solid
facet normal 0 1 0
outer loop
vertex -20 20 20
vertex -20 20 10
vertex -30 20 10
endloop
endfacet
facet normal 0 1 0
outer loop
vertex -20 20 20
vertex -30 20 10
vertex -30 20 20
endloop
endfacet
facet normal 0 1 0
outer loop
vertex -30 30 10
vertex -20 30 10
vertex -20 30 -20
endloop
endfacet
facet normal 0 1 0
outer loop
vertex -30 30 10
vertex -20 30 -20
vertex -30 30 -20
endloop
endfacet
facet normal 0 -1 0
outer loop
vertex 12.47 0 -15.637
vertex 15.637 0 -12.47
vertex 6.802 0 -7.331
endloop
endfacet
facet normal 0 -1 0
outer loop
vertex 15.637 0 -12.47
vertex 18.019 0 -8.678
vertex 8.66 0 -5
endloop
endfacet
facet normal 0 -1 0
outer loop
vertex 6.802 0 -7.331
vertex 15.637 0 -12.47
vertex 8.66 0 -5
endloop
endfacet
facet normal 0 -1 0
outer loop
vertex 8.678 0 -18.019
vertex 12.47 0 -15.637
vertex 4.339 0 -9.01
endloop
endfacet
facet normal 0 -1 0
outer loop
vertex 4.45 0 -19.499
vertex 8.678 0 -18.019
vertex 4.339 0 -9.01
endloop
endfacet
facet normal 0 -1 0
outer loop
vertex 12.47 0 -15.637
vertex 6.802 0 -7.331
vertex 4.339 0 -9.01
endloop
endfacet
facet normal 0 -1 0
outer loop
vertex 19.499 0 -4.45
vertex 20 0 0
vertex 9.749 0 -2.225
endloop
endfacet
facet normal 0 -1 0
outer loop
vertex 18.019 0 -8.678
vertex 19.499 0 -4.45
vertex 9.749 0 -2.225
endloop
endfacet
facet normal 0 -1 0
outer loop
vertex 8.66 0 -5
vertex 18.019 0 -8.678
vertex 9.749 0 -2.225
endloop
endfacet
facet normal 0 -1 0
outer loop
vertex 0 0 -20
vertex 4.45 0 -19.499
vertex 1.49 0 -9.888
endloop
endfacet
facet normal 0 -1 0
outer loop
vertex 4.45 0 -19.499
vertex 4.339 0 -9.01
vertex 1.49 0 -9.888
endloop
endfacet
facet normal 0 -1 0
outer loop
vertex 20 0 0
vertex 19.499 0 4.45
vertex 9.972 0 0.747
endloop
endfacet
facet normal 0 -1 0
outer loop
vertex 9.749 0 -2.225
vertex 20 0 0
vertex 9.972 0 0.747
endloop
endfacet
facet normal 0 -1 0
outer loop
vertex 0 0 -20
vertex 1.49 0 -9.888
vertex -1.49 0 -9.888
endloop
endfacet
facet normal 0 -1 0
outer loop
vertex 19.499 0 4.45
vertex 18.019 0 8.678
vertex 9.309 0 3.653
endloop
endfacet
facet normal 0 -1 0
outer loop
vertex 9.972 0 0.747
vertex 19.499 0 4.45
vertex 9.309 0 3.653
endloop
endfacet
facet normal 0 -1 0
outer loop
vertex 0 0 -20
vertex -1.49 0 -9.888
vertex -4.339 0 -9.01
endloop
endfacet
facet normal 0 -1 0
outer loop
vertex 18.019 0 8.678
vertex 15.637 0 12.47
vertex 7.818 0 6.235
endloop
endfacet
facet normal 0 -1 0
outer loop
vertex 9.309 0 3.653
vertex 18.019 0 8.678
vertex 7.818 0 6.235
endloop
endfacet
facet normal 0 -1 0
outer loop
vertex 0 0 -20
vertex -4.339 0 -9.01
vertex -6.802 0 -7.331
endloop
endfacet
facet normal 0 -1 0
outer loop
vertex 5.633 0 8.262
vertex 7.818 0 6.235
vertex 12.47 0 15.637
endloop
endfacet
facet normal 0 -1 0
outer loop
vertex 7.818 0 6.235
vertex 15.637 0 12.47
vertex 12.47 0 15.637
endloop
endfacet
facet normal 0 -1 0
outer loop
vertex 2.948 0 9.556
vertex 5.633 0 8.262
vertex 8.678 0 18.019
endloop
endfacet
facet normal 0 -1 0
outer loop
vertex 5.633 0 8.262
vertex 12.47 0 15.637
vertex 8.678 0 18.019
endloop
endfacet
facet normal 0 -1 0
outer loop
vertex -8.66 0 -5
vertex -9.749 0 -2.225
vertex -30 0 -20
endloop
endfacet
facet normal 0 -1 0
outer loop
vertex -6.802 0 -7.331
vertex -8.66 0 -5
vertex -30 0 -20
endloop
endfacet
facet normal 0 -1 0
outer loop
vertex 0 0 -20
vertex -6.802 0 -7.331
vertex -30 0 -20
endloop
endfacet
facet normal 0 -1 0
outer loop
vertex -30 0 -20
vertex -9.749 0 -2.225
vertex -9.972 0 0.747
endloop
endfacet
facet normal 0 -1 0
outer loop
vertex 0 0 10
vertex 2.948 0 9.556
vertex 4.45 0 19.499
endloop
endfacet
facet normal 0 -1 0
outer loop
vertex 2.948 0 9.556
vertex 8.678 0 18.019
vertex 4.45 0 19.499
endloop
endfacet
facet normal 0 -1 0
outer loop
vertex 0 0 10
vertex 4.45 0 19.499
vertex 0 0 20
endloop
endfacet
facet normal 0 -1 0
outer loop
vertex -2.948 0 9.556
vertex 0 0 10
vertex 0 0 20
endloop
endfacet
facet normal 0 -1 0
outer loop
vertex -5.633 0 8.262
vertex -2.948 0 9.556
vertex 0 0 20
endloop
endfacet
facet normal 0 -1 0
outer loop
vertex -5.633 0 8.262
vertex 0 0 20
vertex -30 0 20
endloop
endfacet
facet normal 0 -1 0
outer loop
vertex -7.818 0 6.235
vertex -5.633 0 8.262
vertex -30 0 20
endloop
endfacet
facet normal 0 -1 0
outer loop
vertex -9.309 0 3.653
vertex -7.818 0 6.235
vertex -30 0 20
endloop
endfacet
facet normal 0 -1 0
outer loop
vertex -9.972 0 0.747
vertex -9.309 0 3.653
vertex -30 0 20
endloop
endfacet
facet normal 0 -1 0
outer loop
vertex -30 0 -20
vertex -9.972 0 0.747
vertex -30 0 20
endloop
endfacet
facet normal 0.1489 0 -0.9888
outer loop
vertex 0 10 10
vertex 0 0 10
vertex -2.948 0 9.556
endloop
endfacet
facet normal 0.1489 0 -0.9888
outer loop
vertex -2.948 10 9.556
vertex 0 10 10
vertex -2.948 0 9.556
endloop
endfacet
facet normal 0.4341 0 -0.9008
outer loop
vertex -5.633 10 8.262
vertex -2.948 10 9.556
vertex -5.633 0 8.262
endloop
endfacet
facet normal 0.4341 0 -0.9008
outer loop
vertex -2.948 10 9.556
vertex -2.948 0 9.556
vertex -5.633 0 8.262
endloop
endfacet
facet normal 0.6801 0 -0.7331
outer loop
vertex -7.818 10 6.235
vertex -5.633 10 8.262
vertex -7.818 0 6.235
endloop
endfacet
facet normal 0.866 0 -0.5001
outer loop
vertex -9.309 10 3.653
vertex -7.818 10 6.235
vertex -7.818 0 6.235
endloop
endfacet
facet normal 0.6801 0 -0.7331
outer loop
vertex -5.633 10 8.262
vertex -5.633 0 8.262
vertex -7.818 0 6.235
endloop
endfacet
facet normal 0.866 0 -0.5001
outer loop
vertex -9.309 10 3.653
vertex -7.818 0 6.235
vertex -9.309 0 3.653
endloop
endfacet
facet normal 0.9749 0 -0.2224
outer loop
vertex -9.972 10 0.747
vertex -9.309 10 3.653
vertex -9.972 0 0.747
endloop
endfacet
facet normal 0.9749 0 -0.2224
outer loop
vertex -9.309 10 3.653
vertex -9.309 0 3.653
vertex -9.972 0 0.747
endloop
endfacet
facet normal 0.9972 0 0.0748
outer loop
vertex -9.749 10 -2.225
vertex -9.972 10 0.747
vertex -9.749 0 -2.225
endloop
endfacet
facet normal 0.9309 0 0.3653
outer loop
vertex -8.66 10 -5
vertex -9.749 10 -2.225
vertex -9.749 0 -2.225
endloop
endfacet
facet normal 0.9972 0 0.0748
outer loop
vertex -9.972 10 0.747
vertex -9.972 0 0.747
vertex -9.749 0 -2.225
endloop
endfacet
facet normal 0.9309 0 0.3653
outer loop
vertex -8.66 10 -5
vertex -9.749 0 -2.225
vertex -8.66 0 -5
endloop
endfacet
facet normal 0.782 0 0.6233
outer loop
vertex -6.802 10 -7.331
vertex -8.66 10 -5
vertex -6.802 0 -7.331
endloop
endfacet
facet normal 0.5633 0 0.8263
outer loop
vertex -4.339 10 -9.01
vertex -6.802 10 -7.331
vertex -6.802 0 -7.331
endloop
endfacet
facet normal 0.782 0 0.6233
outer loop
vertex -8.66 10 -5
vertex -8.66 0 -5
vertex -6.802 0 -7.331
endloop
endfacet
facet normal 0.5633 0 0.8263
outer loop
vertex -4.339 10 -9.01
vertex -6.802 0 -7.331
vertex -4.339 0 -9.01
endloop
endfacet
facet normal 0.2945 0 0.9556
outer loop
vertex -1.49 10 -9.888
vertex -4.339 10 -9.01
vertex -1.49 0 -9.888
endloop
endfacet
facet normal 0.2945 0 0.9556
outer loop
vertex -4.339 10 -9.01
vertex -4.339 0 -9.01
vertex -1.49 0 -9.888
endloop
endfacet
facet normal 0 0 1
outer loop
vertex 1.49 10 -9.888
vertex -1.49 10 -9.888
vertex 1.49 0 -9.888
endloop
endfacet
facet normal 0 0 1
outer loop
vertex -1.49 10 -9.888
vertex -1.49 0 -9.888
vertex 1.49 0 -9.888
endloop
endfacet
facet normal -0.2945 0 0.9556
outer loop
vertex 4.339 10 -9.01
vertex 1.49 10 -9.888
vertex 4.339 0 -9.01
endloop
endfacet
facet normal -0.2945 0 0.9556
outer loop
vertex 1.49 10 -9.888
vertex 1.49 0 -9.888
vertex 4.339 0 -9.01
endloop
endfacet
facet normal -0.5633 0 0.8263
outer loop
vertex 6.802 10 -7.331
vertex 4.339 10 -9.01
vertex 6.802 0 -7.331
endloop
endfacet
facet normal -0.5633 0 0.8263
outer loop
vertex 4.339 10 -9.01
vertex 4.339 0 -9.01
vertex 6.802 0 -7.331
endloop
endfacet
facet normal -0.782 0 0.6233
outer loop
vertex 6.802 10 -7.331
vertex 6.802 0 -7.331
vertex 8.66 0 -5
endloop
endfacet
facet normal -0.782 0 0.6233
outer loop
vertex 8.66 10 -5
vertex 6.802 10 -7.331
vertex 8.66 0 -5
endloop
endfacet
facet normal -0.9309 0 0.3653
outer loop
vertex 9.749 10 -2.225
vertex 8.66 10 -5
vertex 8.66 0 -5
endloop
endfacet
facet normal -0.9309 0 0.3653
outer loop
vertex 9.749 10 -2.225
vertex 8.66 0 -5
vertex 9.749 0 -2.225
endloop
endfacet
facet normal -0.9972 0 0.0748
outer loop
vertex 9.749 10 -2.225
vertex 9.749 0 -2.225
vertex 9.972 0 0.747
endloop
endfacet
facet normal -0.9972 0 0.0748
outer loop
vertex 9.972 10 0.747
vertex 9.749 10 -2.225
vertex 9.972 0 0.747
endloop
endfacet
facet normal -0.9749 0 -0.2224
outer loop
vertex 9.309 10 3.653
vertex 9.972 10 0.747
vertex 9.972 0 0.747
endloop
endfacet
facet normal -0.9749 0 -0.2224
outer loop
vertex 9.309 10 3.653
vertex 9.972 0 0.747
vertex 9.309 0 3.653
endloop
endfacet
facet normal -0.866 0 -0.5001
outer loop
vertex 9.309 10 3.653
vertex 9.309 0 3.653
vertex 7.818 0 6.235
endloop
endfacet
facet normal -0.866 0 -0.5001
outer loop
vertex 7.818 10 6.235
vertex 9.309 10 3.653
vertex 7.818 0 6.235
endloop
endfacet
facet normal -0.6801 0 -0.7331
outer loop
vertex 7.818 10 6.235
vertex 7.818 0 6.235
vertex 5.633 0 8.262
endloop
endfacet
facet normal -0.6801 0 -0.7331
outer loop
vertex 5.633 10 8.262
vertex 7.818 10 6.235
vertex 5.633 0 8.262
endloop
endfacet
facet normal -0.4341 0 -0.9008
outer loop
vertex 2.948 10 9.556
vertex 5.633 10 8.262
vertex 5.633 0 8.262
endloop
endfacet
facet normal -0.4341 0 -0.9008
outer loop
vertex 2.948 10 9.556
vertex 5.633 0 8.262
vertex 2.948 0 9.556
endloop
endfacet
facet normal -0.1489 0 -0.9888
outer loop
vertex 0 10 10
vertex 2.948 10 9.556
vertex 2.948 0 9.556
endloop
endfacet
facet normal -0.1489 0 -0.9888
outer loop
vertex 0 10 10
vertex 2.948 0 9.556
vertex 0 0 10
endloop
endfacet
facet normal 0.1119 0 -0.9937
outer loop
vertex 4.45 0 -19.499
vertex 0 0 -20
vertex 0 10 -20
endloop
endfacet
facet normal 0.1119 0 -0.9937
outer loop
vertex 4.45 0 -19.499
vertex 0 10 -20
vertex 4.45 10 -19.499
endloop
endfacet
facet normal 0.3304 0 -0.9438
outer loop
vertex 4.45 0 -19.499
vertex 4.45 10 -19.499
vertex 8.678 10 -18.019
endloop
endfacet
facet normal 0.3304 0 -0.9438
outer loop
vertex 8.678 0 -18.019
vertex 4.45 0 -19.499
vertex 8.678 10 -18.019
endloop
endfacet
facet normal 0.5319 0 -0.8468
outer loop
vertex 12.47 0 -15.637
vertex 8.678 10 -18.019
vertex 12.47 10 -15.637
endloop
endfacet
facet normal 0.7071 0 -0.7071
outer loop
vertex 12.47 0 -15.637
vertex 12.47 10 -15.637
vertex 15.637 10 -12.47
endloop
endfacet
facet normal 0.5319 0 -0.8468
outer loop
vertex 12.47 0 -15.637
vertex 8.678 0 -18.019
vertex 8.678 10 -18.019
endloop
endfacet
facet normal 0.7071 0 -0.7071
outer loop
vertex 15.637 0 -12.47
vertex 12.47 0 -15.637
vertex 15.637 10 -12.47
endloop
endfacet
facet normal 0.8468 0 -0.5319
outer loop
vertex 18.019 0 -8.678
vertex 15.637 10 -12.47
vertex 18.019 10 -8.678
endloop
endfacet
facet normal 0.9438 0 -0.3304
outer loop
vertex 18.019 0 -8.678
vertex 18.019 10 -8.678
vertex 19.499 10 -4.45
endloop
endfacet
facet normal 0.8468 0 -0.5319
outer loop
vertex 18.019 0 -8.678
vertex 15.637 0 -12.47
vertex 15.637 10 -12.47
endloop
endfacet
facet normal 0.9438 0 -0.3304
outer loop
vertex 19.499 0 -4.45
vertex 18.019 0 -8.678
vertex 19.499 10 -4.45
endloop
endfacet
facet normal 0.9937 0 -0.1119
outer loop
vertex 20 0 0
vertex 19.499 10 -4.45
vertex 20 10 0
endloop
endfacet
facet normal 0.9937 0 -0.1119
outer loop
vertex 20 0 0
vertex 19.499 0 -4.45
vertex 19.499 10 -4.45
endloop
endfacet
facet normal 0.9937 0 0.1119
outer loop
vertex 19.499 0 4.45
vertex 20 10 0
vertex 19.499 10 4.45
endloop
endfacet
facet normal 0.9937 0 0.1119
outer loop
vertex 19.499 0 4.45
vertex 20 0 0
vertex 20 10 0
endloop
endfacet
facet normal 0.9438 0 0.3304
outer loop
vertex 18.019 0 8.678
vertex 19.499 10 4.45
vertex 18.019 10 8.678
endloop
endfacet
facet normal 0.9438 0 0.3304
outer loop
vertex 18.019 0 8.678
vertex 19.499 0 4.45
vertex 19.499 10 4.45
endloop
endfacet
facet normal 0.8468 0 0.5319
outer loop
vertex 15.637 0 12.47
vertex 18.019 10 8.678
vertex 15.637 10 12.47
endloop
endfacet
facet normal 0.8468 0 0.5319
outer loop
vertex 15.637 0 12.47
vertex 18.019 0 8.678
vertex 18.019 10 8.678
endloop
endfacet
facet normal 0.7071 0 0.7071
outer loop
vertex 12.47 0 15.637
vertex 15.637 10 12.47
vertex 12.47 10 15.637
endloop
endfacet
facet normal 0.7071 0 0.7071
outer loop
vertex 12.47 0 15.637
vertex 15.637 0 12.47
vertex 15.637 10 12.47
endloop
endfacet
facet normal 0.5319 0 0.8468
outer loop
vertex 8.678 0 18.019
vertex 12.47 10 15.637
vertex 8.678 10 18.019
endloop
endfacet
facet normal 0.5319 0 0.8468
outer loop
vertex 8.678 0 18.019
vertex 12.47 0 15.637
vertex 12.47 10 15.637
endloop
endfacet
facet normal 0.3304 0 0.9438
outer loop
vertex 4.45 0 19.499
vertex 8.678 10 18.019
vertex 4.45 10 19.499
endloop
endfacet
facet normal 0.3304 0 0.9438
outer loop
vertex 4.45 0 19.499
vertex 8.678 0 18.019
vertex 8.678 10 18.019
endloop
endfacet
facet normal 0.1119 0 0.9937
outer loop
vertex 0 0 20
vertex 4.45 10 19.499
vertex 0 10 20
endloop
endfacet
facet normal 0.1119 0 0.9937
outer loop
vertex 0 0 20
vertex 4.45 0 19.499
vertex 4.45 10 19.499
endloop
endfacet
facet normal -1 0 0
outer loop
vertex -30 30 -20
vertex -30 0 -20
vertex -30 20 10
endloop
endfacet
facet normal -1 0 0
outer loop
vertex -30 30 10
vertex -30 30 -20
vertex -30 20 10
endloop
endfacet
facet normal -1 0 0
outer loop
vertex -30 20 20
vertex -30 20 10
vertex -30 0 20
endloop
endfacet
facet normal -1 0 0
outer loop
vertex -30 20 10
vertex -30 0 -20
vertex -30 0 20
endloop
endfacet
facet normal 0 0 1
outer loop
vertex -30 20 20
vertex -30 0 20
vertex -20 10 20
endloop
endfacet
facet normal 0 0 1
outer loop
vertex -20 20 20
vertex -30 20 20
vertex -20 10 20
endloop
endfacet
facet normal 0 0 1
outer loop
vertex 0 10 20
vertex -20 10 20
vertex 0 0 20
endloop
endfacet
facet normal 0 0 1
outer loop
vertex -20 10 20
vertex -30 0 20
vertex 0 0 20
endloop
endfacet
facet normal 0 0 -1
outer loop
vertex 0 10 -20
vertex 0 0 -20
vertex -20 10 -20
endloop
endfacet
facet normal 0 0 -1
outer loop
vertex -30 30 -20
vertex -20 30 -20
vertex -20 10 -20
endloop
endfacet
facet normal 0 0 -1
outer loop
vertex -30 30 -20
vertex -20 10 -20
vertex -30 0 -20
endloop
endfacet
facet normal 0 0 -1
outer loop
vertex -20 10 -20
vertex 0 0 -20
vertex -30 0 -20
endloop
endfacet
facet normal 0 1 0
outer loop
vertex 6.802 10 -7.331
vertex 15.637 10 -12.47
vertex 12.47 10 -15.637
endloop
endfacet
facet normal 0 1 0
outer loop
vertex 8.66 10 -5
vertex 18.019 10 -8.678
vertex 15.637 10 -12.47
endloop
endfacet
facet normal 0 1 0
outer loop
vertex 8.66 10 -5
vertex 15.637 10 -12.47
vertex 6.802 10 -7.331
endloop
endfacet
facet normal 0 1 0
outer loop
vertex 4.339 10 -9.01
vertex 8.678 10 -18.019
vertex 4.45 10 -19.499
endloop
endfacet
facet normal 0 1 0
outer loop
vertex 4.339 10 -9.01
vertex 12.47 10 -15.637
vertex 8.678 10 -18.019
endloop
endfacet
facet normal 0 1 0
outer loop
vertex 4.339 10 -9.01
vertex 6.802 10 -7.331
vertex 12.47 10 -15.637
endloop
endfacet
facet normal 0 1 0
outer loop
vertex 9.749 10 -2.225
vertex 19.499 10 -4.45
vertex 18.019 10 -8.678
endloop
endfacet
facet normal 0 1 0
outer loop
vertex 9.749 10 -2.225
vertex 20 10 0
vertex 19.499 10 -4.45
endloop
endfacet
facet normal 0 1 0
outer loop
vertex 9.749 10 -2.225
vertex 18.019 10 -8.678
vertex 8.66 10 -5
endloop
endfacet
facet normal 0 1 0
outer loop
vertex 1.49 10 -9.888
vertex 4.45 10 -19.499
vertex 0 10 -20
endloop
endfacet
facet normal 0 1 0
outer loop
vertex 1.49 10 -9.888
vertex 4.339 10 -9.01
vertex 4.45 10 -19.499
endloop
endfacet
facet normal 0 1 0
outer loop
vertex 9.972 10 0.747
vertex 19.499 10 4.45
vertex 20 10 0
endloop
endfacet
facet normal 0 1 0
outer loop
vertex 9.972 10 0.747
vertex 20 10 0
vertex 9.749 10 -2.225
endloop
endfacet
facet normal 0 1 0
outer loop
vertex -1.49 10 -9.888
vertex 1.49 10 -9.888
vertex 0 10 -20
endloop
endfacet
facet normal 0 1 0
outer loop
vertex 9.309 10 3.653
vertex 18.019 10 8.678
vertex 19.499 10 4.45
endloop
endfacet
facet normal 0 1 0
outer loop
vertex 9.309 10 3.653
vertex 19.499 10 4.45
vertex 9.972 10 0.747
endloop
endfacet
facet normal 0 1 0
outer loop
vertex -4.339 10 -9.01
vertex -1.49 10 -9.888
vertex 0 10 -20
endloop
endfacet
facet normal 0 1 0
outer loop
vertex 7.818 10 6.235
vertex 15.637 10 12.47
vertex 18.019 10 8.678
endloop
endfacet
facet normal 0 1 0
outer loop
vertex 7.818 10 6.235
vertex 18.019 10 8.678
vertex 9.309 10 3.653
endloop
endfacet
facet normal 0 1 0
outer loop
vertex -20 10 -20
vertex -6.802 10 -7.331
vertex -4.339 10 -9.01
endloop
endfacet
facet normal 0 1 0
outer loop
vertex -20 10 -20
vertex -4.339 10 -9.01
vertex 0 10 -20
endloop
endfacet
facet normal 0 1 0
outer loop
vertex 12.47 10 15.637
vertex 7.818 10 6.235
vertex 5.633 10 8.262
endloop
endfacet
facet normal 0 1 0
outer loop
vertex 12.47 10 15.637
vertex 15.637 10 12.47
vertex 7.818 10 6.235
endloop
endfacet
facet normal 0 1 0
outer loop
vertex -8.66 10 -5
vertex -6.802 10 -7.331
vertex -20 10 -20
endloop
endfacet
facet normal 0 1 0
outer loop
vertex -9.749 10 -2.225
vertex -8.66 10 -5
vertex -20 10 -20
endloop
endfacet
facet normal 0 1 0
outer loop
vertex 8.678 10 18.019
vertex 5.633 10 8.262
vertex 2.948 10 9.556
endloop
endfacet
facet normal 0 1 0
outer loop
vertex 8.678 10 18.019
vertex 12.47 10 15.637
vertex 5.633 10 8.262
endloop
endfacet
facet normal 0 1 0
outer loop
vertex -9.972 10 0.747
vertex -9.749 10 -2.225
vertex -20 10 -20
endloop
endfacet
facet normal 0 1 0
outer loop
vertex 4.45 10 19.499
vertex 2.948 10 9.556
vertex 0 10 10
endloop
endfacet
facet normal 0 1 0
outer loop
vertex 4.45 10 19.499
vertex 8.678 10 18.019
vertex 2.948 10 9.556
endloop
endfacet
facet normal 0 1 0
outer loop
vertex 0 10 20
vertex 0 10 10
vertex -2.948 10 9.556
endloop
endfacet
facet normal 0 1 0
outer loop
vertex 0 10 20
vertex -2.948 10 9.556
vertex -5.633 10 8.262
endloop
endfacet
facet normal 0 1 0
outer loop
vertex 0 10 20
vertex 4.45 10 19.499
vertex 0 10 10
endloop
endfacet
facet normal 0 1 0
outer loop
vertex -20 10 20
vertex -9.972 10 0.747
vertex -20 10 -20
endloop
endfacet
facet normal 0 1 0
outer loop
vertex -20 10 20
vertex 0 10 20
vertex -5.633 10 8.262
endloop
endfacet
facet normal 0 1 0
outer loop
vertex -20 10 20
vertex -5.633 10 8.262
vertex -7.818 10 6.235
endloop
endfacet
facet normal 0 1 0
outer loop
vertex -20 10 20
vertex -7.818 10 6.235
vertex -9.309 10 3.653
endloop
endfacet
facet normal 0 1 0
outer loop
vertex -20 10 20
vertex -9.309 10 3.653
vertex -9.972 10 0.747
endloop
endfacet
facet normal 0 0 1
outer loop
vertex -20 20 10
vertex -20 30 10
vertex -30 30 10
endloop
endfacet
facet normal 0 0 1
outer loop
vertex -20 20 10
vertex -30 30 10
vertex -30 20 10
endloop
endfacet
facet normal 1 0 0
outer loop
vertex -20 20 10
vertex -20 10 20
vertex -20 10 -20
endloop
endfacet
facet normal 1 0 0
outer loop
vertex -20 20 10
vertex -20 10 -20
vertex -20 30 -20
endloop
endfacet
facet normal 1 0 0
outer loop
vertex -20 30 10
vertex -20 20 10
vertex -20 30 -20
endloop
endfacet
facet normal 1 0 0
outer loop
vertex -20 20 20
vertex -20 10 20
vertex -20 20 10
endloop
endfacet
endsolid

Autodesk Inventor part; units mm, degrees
ref_plane "YZ Plane" through (0, 0, 0) normal (1, 0, 0) x (0, 1, 0)
ref_plane "XZ Plane" through (0, 0, 0) normal (0, 1, 0) x (-1, 0, 0)
ref_plane "XY Plane" through (0, 0, 0) normal (0, 0, 1) x (1, 0, 0)
sketch "草圖1" plane through (0, 0, 0) normal (0, 1, 0) x (-1, 0, 0)
  circle A0 centre (0, 0) radius 20
  line L0 (0, -20) -> (30, -20)
  line L1 (30, -20) -> (30, 20)
  line L2 (30, 20) -> (0, 20)
  line L3 (0, 20) -> (0, -20)
  point P0 (0, 20)
  dimension "d0" = 40
  dimension "d1" = 30
extrude "擠出1" add sketch "草圖1" along normal blind 30
sketch "草圖2" plane through (-30, 0, 20) normal (0, 0, 1) x (1, 0, 0)
  line L0 (0, 0) -> (0, 30) projected
  line L1 (0, 30) -> (30, 30) projected
  line L2 (30, 0) -> (30, 30) projected
  line L3 (30, 0) -> (0, 0) projected
  line L4 (10, 37.5679) -> (66.1175, 37.5679)
  line L5 (66.1175, 37.5679) -> (66.1175, 10)
  line L6 (66.1175, 10) -> (10, 10)
  line L7 (10, 10) -> (10, 37.5679)
  dimension "d4" = 10
  dimension "d5" = 10
extrude "擠出2" cut sketch "草圖2" against normal blind 48.25 contours L7 L4 L5 L6 L2 L1 | L1 L2 L6 L7
sketch "草圖3" plane through (-20, 10, 20) normal (1, 0, 0) x (0, 0, -1)
  line L0 (0, 0) -> (40, 0) projected
  line L1 (40, 20) -> (40, 0) projected
  line L2 (0, 20) -> (40, 20) projected
  line L3 (0, 0) -> (0, 20) projected
  line L4 (0, -10) -> (0, 0) projected
  line L5 (40, -10) -> (0, -10) projected
  line L6 (40, 0) -> (40, -10) projected
  line L7 (40, 20) -> (0, 20) projected
  line L8 (0, 20) -> (10, 20)
  line L9 (10, 20) -> (10, 10)
  line L10 (10, 10) -> (0, 10)
  line L11 (0, 10) -> (0, 20)
  point P0 (20, -10)
  dimension "d8" = 10
  dimension "d9" = 10
extrude "擠出3" cut sketch "草圖3" against normal blind 10 contours L3 L2 L9 L10
sketch "草圖4" plane through (-20, 10, 20) normal (0, 1, 0) x (1, 0, 0)
  arc A0 (20, 0) -> (20, 40) centre (20, 20) ccw projected
hole "孔1" at (0, 10, 0) direction (0, -1, 0) diameter 20 end through all
properties part number "35" material "鋼、碳鋼"
